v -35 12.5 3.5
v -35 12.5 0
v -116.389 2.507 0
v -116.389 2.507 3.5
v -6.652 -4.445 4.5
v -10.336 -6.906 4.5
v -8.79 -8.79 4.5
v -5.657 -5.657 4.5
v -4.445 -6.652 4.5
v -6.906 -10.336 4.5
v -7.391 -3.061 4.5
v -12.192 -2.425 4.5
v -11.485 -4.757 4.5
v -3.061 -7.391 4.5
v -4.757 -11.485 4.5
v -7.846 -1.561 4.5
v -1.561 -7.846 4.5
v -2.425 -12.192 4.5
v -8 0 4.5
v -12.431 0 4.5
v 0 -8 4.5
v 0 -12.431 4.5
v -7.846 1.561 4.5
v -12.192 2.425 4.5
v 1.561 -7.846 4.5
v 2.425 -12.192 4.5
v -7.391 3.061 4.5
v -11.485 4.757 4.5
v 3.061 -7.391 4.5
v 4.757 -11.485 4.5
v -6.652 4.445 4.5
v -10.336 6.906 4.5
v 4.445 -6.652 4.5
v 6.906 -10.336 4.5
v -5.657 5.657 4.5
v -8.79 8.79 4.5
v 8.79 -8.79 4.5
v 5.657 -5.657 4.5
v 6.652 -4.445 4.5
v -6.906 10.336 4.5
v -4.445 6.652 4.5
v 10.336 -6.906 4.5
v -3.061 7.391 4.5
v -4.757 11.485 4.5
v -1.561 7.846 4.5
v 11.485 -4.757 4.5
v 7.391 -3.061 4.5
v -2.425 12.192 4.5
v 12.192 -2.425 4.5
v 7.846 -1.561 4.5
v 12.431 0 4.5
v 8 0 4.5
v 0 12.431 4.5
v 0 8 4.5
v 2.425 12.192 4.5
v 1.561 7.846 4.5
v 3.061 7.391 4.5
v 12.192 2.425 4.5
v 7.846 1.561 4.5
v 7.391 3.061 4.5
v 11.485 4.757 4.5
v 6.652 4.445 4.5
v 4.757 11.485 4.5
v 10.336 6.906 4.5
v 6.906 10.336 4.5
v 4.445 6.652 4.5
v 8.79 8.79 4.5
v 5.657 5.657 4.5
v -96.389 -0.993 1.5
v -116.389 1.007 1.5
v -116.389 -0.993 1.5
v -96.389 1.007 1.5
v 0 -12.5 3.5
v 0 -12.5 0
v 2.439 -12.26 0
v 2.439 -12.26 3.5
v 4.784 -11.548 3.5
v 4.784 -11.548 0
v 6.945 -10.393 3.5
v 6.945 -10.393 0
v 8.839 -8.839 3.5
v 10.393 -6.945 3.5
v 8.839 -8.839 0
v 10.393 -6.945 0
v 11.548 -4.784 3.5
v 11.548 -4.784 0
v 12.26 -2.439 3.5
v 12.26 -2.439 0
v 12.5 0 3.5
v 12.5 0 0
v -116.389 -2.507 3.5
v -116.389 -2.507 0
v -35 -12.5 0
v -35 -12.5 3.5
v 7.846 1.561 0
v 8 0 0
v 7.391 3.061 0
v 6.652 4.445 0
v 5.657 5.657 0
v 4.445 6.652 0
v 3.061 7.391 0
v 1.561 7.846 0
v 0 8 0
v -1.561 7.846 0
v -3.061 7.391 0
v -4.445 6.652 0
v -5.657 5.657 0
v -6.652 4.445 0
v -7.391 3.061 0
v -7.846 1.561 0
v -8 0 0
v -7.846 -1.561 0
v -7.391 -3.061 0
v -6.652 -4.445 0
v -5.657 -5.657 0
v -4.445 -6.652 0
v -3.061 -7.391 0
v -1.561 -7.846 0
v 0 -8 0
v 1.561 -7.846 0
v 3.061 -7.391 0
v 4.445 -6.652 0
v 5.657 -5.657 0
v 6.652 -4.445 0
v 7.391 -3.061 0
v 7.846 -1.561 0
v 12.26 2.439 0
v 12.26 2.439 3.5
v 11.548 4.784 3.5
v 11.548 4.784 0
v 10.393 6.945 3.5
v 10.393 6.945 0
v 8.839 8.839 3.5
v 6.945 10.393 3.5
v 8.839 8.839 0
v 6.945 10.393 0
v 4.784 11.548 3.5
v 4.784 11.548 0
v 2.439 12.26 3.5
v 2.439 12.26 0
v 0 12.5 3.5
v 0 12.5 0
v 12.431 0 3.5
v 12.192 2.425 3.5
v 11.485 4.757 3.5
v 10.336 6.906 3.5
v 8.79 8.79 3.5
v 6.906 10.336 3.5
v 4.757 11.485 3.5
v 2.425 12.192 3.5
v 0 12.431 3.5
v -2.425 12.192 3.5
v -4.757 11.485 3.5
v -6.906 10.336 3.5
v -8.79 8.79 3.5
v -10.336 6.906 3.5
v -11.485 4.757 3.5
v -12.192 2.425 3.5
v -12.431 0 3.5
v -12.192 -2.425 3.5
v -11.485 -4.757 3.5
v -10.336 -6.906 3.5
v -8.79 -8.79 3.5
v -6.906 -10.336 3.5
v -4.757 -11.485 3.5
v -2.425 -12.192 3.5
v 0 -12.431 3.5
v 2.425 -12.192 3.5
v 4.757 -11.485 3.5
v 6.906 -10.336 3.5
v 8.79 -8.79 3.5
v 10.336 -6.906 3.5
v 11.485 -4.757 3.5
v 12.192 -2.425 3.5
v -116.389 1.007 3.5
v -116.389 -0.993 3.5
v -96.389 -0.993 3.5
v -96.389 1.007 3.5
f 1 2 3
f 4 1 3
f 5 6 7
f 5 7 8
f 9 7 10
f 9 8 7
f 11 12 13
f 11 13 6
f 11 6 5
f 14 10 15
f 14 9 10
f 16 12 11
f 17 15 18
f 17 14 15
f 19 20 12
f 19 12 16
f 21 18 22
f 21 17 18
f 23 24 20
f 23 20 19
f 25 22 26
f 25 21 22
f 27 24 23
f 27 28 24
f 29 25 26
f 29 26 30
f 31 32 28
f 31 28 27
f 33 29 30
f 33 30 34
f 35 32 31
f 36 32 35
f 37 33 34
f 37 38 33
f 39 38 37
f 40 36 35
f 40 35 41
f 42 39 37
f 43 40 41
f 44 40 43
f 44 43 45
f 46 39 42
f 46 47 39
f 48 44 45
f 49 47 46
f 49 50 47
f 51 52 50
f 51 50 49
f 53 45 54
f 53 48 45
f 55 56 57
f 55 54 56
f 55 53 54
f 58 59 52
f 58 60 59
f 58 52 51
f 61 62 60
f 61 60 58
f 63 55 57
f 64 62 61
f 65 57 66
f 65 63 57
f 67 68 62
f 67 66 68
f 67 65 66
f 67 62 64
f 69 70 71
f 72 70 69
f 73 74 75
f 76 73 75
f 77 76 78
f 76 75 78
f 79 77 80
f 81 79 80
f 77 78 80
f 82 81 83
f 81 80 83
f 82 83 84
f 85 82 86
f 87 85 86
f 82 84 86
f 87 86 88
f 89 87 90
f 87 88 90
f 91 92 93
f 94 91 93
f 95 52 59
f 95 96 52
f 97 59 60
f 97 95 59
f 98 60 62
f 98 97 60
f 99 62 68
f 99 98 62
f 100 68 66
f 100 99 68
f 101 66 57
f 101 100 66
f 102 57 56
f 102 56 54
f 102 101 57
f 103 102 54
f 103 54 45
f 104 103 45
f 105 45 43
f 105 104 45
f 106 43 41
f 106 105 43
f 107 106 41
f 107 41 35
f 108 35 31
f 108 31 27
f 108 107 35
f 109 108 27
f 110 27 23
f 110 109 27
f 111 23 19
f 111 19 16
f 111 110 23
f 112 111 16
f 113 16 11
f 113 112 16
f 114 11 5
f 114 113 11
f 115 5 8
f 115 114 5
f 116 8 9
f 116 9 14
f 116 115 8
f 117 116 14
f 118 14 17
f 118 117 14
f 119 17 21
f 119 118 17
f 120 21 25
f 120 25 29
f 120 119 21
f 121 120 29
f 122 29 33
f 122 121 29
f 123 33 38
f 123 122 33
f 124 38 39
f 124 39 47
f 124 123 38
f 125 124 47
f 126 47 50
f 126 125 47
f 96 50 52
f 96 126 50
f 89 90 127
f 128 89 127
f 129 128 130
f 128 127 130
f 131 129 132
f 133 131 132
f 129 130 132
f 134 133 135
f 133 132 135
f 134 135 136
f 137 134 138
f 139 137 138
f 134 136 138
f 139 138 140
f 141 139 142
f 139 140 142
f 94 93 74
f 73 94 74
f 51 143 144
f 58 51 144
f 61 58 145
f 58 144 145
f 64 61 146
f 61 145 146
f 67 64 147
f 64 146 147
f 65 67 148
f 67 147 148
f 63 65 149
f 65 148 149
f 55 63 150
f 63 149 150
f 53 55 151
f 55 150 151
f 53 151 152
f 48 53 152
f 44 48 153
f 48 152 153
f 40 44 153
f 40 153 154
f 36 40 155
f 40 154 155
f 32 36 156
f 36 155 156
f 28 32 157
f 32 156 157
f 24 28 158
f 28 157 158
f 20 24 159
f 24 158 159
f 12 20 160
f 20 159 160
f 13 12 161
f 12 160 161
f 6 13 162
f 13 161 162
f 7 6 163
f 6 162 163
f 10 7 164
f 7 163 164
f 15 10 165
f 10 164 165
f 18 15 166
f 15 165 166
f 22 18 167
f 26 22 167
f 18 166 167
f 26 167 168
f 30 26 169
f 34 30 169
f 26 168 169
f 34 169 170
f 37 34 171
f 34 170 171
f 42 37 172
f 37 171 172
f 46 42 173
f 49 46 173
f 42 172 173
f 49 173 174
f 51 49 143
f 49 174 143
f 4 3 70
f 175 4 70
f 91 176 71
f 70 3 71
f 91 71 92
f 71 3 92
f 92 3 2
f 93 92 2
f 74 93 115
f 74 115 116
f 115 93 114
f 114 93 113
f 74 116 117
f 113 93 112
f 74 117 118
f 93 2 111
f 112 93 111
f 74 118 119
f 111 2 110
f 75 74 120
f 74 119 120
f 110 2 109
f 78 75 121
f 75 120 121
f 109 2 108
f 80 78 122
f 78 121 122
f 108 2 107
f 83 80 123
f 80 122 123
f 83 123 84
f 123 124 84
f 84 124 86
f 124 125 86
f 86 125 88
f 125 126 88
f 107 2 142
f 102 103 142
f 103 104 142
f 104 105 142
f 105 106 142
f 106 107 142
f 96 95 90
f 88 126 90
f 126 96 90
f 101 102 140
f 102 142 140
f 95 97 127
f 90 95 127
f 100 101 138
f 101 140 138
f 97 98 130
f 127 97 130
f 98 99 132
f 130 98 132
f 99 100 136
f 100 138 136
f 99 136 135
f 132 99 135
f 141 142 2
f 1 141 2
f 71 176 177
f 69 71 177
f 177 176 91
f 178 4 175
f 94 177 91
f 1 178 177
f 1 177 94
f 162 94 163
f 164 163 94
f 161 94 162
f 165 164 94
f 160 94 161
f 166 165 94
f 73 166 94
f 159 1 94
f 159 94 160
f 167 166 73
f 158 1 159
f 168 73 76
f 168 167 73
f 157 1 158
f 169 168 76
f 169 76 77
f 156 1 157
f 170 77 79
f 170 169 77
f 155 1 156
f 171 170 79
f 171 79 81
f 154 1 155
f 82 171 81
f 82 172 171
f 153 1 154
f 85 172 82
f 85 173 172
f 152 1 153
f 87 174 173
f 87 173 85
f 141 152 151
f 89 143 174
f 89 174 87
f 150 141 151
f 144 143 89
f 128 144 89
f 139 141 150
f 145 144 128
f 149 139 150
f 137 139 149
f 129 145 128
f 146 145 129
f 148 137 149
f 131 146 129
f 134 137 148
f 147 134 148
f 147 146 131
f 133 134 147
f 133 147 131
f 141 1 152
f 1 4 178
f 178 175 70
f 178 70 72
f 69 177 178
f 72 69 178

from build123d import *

# Parameters (mm, degrees)
F0_R     = 8
F1_DEPTH = 3.5
F2_R     = 12.430903
F2_R_2   = 8
F3_DEPTH = 1
F4_W     = 20
F4_H     = 2
F5_DEPTH = 2


with BuildPart() as f1:
    # F0 (on Top) → F1 (new body)
    with BuildSketch(Plane.XY):
        with BuildLine():
            ThreePointArc((0, -12.5), (8.838835, -8.838835), (12.5, 0))
            ThreePointArc((12.5, 0), (8.838835, 8.838835), (0, 12.5))
            ThreePointArc((0, 12.5), (-12.5, 0), (0, -12.5))
        make_face()
        Circle(F0_R, mode=Mode.SUBTRACT)
        with BuildLine():
            ThreePointArc((0, -12.5), (-12.5, 0), (0, 12.5))
            Line((0, 12.5), (-35, 12.5))
            Line((-35, 12.5), (-116.388784, 2.506714))
            Line((-116.388784, 2.506714), (-116.388784, -2.506714))
            Line((-116.388784, -2.506714), (-35, -12.5))
            Line((-35, -12.5), (0, -12.5))
        make_face()
    extrude(amount=F1_DEPTH)

    # F2 (on face) → F3 (join)
    with BuildSketch(Plane.XY.offset(3.5)):
        Circle(F2_R)
        Circle(F2_R_2, mode=Mode.SUBTRACT)
    extrude(amount=F3_DEPTH)

    # F4 (on face) → F5 (cut)
    with BuildSketch(Plane.XY.offset(3.5)):
        with Locations((-106.388784, 0.006714)):
            Rectangle(F4_W, F4_H)
    extrude(amount=-F5_DEPTH, mode=Mode.SUBTRACT)


solid = f1.part
